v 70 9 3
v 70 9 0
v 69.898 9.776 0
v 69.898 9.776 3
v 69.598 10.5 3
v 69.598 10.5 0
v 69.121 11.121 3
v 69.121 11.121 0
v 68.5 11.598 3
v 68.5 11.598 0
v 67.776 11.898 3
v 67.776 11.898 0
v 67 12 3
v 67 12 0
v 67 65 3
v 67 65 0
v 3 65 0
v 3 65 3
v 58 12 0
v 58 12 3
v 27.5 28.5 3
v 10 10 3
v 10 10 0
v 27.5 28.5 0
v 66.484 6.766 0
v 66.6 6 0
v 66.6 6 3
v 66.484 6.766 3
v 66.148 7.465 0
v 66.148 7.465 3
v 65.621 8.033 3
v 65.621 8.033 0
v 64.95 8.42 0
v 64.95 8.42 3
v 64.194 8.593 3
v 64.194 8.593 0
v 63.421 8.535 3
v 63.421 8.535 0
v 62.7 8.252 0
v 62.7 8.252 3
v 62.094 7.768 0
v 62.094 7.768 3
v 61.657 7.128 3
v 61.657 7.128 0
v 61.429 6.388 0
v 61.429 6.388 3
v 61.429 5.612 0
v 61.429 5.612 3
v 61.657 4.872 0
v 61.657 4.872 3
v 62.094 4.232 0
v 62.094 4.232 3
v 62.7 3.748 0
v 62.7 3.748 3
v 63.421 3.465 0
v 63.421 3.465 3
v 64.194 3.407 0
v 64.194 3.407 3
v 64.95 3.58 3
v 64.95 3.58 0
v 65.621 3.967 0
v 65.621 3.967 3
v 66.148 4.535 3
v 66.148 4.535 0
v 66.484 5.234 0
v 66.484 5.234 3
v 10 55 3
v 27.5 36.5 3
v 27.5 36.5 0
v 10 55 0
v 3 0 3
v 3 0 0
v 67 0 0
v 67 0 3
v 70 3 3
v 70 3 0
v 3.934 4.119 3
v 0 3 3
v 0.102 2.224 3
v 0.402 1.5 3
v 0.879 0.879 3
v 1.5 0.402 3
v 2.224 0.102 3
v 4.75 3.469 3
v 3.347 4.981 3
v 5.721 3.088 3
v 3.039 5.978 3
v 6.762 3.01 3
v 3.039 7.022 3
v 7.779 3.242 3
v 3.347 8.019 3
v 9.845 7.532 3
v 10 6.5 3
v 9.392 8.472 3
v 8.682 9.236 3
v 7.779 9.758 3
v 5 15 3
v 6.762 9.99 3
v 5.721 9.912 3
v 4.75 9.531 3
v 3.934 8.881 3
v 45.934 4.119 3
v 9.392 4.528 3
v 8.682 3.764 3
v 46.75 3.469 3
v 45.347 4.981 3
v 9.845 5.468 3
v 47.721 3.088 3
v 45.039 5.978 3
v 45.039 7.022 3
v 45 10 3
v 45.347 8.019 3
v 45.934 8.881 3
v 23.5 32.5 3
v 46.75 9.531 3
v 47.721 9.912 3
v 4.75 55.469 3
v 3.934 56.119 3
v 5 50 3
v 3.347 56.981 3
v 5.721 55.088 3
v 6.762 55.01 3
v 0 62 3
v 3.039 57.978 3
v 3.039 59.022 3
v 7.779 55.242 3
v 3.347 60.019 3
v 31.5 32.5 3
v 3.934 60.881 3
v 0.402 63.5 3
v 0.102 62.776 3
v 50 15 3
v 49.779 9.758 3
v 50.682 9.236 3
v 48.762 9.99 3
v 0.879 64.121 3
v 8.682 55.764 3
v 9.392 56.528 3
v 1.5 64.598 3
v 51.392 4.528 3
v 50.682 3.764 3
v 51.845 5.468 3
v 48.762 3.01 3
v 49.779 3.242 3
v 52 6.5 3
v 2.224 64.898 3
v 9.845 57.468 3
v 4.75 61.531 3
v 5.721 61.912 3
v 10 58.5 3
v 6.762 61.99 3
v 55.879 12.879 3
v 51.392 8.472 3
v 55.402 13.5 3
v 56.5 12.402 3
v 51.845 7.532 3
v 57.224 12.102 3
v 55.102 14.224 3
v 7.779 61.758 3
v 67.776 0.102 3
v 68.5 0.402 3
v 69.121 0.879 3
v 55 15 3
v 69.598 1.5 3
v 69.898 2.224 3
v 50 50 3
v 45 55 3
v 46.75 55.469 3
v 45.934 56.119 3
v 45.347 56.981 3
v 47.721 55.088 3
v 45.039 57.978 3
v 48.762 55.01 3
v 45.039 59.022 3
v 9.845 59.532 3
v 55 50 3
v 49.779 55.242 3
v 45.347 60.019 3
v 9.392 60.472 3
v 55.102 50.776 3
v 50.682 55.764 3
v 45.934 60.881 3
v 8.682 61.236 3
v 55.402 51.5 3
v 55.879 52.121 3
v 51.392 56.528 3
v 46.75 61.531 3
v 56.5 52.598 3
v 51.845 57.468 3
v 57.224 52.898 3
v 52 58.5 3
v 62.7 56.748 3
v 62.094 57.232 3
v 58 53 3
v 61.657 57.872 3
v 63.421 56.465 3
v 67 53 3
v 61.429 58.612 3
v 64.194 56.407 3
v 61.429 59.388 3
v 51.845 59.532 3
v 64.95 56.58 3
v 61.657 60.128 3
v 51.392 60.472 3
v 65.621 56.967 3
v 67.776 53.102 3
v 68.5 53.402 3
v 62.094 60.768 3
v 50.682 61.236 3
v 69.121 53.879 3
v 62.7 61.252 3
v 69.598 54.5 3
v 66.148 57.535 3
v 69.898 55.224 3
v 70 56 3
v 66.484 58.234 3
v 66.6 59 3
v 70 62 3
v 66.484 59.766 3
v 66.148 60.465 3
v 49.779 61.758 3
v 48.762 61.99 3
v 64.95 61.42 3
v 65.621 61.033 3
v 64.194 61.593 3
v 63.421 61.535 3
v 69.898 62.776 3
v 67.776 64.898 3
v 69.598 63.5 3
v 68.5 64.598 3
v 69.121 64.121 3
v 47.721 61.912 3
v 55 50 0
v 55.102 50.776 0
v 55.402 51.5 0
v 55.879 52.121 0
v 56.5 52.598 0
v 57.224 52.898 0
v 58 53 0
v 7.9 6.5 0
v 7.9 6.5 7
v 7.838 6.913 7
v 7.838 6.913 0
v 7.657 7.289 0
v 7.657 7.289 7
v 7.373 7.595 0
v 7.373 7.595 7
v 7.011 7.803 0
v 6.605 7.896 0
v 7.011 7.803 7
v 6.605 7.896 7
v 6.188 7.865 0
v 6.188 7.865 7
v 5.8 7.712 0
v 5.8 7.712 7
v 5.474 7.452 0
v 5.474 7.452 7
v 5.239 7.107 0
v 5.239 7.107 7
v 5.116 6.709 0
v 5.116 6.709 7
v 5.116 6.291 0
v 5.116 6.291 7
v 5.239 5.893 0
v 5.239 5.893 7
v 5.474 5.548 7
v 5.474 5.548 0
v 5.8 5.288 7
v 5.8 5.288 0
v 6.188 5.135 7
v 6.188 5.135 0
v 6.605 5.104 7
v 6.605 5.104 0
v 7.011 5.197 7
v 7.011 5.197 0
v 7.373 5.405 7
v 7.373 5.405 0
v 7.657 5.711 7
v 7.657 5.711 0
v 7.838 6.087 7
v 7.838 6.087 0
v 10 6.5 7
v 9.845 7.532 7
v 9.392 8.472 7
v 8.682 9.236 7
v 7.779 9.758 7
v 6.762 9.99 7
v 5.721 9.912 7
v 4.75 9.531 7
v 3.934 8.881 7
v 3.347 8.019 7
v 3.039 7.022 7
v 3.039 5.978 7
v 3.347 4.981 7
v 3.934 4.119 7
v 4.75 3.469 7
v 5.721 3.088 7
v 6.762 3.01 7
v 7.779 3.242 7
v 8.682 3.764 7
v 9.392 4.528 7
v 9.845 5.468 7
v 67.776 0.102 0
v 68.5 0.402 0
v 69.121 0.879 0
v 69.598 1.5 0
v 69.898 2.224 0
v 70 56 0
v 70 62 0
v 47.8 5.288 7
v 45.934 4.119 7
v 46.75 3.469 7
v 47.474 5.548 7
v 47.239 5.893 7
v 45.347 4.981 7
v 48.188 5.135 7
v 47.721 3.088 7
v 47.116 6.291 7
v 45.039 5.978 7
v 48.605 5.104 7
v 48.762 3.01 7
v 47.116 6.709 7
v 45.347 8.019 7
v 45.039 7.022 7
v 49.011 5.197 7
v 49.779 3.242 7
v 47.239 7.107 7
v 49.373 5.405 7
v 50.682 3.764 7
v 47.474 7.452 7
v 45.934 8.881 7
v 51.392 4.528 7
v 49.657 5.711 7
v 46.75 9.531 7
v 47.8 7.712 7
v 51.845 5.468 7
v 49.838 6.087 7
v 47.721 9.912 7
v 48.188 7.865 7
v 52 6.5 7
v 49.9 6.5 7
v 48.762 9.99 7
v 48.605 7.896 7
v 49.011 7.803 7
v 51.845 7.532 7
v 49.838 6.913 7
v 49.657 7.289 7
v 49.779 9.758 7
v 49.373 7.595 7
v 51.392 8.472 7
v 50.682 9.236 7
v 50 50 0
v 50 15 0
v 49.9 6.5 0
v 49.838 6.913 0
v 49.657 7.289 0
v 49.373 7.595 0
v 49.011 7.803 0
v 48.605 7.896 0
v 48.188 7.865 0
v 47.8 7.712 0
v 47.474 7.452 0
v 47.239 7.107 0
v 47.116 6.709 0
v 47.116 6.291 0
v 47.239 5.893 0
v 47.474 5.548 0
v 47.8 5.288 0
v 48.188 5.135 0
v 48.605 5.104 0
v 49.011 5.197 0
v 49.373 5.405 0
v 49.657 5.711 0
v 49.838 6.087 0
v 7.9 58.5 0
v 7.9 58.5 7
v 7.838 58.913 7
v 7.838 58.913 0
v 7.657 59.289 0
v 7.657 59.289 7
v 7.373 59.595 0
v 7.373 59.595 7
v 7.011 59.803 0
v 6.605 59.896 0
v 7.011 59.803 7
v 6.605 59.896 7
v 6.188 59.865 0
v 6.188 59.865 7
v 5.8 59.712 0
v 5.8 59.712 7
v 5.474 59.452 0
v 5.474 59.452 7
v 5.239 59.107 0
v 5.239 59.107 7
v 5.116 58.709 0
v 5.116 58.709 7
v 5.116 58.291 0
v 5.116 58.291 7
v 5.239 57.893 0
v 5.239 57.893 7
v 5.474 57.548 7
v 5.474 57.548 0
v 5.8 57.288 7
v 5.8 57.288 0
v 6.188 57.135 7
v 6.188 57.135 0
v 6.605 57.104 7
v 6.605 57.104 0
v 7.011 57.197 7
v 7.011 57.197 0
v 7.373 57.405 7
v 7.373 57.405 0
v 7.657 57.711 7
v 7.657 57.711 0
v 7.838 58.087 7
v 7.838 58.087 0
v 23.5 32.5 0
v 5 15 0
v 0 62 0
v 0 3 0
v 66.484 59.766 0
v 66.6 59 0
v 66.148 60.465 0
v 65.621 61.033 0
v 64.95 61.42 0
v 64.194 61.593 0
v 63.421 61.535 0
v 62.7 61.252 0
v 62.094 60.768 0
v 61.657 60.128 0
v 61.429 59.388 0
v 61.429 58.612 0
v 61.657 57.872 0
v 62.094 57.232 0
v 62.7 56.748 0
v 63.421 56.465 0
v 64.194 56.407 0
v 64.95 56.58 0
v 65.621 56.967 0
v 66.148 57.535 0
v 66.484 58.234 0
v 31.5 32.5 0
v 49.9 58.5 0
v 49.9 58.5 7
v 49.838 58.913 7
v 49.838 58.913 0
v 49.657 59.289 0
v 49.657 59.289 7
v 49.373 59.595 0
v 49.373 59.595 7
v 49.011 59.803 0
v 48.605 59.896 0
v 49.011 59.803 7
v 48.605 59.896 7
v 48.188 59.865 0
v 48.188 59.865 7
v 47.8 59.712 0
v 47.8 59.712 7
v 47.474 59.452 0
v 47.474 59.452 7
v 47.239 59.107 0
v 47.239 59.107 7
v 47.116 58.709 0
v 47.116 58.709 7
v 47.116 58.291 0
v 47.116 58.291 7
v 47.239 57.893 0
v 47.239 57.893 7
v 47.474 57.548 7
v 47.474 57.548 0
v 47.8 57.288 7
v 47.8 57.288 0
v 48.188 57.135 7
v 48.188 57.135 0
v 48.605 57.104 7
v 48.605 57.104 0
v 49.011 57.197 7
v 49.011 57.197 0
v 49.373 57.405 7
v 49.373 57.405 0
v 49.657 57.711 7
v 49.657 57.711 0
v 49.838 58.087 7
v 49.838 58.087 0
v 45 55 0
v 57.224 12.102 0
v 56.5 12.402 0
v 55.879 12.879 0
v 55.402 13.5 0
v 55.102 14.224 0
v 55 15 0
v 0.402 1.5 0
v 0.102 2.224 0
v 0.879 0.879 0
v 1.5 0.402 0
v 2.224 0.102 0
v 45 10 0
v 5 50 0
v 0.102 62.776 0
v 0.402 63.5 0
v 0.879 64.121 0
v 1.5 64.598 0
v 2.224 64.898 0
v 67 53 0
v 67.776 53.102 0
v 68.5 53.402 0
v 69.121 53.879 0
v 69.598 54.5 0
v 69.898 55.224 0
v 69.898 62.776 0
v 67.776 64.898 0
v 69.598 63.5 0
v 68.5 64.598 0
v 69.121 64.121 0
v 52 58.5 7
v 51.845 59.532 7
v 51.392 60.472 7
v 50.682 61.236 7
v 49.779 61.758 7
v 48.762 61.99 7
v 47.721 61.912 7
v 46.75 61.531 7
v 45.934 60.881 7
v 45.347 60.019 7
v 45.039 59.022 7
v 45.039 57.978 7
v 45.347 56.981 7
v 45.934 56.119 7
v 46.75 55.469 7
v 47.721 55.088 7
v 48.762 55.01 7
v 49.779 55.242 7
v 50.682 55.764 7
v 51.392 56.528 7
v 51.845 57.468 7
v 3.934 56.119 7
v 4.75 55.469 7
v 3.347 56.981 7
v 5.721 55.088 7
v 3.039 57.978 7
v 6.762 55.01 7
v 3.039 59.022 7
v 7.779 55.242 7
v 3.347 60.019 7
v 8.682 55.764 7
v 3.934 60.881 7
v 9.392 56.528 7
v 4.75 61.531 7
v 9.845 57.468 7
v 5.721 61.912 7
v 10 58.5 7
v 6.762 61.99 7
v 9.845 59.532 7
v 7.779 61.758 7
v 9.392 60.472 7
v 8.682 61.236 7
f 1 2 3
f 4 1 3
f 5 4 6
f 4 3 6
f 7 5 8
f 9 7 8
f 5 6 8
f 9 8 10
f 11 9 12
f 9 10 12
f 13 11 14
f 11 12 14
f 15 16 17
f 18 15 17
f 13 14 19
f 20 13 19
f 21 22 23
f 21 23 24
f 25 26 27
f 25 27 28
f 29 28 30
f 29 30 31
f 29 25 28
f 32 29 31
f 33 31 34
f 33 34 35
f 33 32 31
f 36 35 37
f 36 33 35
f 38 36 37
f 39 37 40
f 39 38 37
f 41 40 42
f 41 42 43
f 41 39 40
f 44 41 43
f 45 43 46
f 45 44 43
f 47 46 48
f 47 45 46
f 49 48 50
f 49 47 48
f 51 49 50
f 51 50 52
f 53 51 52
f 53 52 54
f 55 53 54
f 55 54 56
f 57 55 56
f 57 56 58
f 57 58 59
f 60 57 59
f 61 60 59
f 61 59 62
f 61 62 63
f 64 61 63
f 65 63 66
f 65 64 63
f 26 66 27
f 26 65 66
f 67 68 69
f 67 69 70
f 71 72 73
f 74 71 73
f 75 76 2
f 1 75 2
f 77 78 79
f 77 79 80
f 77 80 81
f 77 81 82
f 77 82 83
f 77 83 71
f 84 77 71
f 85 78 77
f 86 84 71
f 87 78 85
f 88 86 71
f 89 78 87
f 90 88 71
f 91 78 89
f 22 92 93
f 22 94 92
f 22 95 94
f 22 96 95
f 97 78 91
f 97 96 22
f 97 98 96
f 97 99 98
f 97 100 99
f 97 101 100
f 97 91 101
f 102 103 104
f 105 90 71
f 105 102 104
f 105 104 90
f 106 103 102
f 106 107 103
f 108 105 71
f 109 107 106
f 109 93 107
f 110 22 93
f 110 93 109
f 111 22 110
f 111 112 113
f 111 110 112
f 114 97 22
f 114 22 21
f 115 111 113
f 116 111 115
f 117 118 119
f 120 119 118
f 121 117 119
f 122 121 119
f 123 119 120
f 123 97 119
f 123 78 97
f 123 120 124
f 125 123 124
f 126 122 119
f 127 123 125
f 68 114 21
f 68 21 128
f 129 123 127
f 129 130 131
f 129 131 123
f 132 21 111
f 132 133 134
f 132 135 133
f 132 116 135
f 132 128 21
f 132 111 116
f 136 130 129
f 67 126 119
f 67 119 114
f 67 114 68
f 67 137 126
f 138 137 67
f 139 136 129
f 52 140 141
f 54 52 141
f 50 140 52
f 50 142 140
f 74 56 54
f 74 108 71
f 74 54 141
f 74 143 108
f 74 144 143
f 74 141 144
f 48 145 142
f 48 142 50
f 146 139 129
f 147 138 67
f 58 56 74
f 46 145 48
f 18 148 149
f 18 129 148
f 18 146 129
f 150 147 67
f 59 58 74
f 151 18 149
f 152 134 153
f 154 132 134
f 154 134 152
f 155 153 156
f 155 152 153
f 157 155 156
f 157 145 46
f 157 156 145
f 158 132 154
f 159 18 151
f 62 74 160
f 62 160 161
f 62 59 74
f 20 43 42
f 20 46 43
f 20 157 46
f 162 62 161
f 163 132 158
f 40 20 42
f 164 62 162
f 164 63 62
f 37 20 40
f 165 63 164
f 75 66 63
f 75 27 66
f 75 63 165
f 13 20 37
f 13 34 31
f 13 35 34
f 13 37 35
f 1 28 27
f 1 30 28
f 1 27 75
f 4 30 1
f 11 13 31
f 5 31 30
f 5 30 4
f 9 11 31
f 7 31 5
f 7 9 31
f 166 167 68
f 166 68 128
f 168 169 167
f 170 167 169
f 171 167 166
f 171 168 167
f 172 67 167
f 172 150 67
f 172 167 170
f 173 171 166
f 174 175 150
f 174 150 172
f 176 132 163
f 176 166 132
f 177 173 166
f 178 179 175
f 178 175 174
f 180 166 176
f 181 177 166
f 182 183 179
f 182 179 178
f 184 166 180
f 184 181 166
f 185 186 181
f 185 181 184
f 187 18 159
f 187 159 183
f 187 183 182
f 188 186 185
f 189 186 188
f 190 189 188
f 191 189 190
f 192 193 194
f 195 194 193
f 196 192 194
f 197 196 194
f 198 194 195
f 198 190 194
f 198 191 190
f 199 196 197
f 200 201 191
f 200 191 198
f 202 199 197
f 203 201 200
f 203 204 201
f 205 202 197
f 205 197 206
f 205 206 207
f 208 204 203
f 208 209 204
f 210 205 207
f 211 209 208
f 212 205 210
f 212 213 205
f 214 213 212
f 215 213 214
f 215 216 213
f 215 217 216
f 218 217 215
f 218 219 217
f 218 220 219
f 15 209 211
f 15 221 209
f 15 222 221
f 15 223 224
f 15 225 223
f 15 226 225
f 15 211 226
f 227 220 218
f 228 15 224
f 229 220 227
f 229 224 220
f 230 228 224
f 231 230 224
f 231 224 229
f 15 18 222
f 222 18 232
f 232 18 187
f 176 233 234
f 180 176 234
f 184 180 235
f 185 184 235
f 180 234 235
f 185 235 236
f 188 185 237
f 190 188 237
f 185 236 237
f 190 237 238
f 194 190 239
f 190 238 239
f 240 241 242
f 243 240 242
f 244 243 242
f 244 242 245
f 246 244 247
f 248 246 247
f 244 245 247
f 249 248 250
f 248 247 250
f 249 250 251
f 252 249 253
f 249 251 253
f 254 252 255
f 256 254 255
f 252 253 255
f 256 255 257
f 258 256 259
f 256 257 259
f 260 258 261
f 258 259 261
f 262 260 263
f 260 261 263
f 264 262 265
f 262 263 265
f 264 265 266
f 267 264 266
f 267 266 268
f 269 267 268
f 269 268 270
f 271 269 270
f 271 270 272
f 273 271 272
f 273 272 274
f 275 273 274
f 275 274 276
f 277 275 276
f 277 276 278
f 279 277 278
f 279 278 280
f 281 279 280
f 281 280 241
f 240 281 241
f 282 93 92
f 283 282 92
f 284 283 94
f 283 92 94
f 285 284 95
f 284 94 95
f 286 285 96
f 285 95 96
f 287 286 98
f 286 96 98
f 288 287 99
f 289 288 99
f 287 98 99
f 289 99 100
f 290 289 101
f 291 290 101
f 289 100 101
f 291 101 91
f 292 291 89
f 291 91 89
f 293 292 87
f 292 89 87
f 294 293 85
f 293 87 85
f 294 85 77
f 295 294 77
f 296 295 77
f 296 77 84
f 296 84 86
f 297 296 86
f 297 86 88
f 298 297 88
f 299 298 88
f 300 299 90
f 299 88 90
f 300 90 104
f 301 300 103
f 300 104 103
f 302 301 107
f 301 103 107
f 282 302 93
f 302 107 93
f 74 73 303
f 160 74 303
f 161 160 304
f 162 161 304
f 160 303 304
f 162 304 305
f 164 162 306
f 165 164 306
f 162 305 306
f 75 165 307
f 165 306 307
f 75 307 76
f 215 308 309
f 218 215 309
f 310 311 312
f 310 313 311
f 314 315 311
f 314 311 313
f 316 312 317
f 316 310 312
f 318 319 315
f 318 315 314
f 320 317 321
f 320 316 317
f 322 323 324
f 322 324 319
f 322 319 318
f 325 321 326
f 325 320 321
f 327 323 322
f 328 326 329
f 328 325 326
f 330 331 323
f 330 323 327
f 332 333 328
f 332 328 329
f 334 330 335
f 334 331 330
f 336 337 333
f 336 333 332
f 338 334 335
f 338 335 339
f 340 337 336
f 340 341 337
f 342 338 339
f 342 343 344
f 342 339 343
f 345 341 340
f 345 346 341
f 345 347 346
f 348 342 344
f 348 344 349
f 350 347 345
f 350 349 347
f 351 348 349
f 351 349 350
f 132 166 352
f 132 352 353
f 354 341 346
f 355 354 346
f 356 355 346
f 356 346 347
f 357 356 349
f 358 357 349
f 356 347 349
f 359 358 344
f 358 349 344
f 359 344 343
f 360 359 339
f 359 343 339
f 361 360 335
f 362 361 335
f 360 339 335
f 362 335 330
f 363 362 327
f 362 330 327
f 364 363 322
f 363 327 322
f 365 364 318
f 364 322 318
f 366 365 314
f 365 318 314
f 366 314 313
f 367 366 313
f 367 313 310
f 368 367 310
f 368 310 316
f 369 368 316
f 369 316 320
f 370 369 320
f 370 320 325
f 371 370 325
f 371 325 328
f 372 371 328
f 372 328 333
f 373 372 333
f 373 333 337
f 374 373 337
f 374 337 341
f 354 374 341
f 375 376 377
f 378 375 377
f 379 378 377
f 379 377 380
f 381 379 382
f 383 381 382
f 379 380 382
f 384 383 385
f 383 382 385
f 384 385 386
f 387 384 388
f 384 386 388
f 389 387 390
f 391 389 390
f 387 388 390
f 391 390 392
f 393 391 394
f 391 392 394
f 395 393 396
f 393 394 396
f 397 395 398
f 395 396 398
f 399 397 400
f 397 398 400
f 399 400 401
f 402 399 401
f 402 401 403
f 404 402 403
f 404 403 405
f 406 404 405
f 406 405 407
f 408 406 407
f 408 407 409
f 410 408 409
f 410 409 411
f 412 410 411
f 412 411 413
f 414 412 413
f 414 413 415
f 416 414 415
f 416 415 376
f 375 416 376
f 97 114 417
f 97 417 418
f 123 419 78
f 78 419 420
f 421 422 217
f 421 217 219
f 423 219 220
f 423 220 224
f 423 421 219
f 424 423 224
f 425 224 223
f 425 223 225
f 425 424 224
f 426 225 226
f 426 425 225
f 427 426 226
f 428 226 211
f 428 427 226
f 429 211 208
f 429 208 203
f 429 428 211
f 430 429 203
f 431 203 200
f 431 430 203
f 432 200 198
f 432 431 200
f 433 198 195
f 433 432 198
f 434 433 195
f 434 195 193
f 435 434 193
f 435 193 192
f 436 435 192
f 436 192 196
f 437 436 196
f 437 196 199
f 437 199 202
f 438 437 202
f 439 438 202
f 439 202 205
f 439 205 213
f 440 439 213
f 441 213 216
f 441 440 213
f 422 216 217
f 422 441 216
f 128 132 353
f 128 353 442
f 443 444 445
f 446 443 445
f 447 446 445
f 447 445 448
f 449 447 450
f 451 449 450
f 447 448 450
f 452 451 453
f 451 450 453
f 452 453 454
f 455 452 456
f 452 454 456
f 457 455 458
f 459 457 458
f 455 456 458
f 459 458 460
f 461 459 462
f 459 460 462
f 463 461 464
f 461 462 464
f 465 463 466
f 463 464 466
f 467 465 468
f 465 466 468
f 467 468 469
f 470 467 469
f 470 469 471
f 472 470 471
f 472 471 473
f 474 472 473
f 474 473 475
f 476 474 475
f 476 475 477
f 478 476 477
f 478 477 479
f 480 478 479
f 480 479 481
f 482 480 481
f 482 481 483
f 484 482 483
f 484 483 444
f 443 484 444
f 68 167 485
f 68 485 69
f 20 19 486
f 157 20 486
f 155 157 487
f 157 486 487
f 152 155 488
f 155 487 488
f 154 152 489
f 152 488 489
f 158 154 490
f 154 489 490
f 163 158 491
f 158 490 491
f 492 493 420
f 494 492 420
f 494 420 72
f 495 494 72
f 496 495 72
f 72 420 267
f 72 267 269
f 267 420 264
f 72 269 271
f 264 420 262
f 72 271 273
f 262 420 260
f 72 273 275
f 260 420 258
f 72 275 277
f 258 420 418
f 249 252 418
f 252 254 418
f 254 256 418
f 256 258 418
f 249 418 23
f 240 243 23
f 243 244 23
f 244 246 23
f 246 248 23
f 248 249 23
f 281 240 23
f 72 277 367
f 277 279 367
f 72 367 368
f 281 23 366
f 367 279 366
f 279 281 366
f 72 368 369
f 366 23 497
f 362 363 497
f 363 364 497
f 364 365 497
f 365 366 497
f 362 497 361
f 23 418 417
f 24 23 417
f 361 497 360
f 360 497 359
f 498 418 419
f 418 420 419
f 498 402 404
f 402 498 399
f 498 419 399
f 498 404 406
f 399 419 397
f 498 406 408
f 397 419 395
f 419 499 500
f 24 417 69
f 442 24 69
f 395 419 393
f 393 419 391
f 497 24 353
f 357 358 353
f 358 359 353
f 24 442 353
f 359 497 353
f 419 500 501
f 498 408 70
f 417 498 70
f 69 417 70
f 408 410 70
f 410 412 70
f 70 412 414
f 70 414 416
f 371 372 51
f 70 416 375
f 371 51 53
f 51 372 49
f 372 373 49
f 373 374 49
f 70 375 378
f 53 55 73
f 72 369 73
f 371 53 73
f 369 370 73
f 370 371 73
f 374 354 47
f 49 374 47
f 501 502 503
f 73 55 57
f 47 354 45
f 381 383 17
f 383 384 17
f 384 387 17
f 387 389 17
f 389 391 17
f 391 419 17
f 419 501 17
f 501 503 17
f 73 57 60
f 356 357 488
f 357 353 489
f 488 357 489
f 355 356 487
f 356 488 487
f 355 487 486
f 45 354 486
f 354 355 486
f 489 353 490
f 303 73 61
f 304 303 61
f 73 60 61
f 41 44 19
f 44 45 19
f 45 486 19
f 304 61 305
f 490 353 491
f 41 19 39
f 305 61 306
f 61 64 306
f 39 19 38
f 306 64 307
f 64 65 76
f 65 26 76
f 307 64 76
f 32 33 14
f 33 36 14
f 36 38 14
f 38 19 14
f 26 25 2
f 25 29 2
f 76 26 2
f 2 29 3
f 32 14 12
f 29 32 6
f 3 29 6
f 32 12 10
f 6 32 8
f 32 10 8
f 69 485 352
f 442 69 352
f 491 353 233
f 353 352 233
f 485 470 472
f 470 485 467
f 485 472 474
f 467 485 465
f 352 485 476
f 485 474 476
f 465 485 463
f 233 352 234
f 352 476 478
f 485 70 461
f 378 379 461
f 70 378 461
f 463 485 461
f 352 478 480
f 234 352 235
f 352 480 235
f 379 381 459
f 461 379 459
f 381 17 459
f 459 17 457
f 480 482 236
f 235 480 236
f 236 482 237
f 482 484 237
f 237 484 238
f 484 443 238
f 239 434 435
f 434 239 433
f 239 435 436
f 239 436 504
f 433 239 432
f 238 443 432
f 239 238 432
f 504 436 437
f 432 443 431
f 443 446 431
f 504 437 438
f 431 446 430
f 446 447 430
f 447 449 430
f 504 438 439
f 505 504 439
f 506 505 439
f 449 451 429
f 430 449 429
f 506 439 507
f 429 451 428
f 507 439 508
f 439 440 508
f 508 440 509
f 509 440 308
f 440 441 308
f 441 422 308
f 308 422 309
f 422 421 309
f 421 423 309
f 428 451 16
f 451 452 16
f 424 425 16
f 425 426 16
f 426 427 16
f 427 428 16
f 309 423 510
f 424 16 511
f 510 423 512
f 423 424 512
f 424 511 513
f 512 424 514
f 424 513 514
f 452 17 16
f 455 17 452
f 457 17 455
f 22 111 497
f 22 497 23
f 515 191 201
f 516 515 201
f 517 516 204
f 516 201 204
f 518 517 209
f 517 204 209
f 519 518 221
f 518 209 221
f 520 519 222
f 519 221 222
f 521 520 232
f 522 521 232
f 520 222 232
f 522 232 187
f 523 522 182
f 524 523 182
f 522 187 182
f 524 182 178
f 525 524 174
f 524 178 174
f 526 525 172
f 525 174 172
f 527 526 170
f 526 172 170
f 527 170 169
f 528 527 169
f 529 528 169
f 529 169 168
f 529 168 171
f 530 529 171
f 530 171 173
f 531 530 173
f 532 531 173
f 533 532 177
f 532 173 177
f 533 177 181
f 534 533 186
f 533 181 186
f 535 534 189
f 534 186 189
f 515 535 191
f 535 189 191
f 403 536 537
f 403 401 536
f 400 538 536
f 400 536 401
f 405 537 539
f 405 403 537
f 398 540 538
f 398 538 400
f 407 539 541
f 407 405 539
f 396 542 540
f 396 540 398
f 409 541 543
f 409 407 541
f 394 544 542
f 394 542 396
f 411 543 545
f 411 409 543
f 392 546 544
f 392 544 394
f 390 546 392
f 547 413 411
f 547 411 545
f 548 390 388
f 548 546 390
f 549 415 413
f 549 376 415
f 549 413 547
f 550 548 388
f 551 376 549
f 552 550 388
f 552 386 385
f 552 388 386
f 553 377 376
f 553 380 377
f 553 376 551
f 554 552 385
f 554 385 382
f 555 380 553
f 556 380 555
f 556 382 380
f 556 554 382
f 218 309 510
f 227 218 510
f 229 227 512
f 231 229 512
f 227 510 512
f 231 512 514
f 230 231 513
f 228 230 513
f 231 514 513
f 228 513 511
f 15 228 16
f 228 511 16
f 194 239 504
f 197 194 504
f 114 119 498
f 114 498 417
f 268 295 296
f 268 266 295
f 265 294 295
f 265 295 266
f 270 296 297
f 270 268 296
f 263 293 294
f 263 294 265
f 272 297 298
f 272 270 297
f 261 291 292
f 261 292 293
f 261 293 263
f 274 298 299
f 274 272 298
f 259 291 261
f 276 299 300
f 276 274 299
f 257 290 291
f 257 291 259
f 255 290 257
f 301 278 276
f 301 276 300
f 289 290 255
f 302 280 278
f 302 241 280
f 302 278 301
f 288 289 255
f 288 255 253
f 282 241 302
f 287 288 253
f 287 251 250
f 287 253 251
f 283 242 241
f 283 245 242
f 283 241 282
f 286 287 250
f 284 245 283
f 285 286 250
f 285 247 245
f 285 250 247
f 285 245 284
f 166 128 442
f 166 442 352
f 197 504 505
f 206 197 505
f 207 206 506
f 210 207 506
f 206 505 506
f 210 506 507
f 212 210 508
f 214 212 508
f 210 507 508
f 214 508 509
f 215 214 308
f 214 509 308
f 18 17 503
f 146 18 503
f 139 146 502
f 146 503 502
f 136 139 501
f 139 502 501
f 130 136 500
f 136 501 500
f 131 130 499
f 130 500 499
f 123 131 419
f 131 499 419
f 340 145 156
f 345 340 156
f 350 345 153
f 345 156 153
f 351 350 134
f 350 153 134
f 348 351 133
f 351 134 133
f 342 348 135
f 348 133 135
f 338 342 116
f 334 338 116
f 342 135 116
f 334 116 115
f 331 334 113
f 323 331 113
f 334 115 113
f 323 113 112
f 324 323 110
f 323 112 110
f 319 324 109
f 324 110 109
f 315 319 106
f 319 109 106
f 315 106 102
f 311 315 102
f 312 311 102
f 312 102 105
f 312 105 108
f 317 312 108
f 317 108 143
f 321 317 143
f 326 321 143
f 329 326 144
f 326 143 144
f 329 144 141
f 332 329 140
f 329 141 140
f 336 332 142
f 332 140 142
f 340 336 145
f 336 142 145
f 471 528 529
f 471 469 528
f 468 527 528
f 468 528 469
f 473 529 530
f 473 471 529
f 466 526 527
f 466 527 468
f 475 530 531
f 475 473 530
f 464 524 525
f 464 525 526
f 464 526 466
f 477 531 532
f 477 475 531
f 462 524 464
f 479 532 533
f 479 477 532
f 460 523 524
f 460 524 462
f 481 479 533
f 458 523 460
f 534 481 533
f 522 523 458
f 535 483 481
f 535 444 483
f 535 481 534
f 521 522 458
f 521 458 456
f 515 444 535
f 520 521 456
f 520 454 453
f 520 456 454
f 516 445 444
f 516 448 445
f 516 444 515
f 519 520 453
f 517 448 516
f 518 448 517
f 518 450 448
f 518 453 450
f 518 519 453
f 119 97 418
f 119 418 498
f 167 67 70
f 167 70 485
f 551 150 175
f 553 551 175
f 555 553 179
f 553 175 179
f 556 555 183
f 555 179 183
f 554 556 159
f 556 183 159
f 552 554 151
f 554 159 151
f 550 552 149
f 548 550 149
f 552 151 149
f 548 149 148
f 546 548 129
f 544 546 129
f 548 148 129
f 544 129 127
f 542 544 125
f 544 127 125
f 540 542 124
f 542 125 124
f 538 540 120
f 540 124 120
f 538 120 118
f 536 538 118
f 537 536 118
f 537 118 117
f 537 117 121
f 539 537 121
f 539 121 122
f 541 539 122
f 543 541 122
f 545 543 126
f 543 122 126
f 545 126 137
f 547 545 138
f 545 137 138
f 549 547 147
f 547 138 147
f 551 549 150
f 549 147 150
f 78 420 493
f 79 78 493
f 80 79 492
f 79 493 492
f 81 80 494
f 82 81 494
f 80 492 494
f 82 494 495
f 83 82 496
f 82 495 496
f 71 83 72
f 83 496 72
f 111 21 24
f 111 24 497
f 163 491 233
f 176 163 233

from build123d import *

# Parameters (mm, degrees)
SKETCH1_R           = 2.6
BOSS_EXTRUDE1_DEPTH = 3
SKETCH2_R           = 3.5
BOSS_EXTRUDE2_DEPTH = 4
CUT_EXTRUDE1_DEPTH  = 3
SKETCH4_R           = 1.4
CUT_EXTRUDE2_DEPTH  = 96.781000204


with BuildPart() as part:
    # Sketch1 → Boss-Extrude1 (new body)
    with BuildSketch(Plane.XY):
        with BuildLine():
            ThreePointArc((0, 3), (0.878679656, 0.878679656), (3, 0))
            Line((3, 0), (67, 0))
            ThreePointArc((67, 0), (69.121320344, 0.878679656), (70, 3))
            Line((70, 3), (70, 9))
            ThreePointArc((70, 9), (69.121320344, 11.121320344), (67, 12))
            Line((67, 12), (58, 12))
            ThreePointArc((58, 12), (55.878679656, 12.878679656), (55, 15))
            Line((55, 15), (55, 50))
            ThreePointArc((55, 50), (55.878679656, 52.121320344), (58, 53))
            Line((58, 53), (67, 53))
            ThreePointArc((67, 53), (69.121320344, 53.878679656), (70, 56))
            Line((70, 56), (70, 62))
            ThreePointArc((70, 62), (69.121320344, 64.121320344), (67, 65))
            Line((67, 65), (62, 65))
            Line((62, 65), (3, 65))
            ThreePointArc((3, 65), (0.878679656, 64.121320344), (0, 62))
            Line((0, 62), (0, 3))
        make_face()
        with Locations((64, 6)):
            Circle(SKETCH1_R, mode=Mode.SUBTRACT)
        with Locations((64, 59)):
            Circle(SKETCH1_R, mode=Mode.SUBTRACT)
    extrude(amount=BOSS_EXTRUDE1_DEPTH)

    # Sketch2 → Boss-Extrude2 (add)
    with BuildSketch(Plane.XY.offset(3)):
        with Locations((6.5, 58.5)):
            Circle(SKETCH2_R)
        with Locations((48.5, 58.5)):
            Circle(SKETCH2_R)
        with Locations((6.5, 6.5)):
            Circle(SKETCH2_R)
        with Locations((48.5, 6.5)):
            Circle(SKETCH2_R)
    extrude(amount=BOSS_EXTRUDE2_DEPTH)

    # Sketch3 → Cut-Extrude1 (cut)
    with BuildSketch(Plane.XY.offset(3)):
        Polygon((10, 55), (45, 55), (27.5, 36.5), align=None)
        Polygon((50, 50), (50, 15), (31.5, 32.5), align=None)
        Polygon((45, 10), (10, 10), (27.5, 28.5), align=None)
        Polygon((5, 15), (5, 50), (23.5, 32.5), align=None)
    extrude(amount=-CUT_EXTRUDE1_DEPTH, mode=Mode.SUBTRACT)

    # Sketch4 → Cut-Extrude2 (cut, through all)
    with BuildSketch(Plane.XY.offset(7)):
        with Locations((6.5, 58.5)):
            Circle(SKETCH4_R)
        with Locations((48.5, 6.5)):
            Circle(SKETCH4_R)
        with Locations((6.5, 6.5)):
            Circle(SKETCH4_R)
        with Locations((48.5, 58.5)):
            Circle(SKETCH4_R)
    extrude(amount=-CUT_EXTRUDE2_DEPTH, mode=Mode.SUBTRACT)


solid = part.part
